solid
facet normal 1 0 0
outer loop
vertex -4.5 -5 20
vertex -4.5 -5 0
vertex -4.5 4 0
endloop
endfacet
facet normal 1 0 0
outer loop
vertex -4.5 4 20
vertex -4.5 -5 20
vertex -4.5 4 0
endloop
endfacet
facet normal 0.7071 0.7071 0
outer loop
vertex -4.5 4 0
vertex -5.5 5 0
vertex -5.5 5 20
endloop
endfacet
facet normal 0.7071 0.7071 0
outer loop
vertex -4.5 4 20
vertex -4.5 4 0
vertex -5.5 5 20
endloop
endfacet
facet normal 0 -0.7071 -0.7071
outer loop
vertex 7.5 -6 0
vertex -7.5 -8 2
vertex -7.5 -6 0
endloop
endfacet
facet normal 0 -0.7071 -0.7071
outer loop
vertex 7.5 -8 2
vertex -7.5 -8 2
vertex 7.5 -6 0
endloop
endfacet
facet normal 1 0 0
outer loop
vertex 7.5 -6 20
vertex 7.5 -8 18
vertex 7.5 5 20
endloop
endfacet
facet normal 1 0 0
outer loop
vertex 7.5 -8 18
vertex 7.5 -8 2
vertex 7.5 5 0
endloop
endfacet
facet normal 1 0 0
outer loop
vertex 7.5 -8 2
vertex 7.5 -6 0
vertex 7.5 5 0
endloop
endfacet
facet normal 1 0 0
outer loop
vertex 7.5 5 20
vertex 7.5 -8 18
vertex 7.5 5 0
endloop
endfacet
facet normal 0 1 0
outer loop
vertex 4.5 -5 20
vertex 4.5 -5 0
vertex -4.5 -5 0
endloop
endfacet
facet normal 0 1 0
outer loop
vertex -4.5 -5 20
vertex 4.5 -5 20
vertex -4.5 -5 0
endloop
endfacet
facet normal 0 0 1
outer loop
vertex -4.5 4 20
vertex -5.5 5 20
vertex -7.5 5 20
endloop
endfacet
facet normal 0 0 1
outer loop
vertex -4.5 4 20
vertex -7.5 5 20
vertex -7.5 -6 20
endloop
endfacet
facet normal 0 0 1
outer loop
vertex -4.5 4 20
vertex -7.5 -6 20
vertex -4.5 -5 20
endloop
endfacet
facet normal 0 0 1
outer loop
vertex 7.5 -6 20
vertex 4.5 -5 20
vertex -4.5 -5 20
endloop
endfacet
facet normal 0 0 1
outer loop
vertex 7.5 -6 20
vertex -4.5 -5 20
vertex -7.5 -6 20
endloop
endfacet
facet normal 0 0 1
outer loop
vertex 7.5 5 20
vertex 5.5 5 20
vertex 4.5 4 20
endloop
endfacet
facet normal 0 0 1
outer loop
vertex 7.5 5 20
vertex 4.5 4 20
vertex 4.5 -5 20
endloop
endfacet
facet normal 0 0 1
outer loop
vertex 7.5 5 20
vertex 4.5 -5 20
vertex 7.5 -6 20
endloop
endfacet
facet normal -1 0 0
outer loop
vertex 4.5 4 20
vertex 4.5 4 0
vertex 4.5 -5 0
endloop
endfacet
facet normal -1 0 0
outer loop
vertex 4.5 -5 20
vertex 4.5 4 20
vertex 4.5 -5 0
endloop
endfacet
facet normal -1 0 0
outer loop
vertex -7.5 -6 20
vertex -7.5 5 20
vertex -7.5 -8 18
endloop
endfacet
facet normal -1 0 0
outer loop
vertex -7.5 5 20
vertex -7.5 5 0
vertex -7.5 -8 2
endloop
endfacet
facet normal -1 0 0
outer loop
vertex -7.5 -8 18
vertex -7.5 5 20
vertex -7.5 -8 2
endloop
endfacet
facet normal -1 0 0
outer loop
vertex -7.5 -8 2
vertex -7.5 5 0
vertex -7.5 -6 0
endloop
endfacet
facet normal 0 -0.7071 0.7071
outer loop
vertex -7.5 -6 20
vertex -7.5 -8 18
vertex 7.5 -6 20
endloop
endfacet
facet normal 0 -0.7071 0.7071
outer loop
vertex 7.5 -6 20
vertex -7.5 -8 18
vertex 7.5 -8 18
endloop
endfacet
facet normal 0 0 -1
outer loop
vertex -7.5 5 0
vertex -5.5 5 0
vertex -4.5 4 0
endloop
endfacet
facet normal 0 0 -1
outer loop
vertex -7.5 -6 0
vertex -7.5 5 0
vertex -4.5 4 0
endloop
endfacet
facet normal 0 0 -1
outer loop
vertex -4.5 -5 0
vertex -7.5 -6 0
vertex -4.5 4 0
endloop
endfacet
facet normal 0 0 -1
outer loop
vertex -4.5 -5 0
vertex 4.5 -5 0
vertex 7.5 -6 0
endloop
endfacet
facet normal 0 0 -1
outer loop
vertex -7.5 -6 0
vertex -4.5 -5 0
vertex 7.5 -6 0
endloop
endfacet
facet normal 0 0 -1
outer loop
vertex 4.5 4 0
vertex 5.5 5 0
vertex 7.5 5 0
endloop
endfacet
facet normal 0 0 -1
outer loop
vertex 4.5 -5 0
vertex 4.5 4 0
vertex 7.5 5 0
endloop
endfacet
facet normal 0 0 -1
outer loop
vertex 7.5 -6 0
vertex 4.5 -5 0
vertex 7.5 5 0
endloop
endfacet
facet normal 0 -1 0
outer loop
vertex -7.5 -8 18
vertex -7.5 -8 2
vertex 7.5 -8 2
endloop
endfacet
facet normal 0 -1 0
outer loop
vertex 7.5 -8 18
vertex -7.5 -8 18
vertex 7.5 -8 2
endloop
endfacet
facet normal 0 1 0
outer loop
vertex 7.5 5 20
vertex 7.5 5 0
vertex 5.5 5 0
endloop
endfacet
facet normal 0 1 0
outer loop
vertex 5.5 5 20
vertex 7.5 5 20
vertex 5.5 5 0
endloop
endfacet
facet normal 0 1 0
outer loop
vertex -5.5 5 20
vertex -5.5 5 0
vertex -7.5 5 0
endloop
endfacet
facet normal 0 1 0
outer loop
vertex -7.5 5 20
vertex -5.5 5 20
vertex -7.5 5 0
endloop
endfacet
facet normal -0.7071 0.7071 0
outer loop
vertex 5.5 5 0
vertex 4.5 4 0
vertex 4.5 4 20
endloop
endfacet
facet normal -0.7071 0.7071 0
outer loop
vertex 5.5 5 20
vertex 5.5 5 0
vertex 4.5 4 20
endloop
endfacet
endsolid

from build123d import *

# Parameters (mm, degrees)
PAD_DEPTH       = 20
CHAMFER_SIZE    = 1
CHAMFER001_SIZE = 2


with BuildPart() as part:
    # Sketch → Pad (new body)
    with BuildSketch(Plane.XY):
        Polygon((-7.5, 5), (-7.5, -8), (7.5, -8), (7.5, 5), (4.5, 5), (4.5, -5), (-4.5, -5), (-4.5, 5), align=None)
    extrude(amount=PAD_DEPTH)

    # Chamfer
    chamfer_edges = [part.edges().sort_by_distance(p)[0] for p in [
        (-4.5, 5, 10),
        (4.5, 5, 10),
    ]]
    chamfer(chamfer_edges, length=CHAMFER_SIZE)

    # Chamfer001
    chamfer001_edges = [part.edges().sort_by_distance(p)[0] for p in [
        (0, -8, 20),
        (0, -8, 0),
    ]]
    chamfer(chamfer001_edges, length=CHAMFER001_SIZE)


solid = part.part
